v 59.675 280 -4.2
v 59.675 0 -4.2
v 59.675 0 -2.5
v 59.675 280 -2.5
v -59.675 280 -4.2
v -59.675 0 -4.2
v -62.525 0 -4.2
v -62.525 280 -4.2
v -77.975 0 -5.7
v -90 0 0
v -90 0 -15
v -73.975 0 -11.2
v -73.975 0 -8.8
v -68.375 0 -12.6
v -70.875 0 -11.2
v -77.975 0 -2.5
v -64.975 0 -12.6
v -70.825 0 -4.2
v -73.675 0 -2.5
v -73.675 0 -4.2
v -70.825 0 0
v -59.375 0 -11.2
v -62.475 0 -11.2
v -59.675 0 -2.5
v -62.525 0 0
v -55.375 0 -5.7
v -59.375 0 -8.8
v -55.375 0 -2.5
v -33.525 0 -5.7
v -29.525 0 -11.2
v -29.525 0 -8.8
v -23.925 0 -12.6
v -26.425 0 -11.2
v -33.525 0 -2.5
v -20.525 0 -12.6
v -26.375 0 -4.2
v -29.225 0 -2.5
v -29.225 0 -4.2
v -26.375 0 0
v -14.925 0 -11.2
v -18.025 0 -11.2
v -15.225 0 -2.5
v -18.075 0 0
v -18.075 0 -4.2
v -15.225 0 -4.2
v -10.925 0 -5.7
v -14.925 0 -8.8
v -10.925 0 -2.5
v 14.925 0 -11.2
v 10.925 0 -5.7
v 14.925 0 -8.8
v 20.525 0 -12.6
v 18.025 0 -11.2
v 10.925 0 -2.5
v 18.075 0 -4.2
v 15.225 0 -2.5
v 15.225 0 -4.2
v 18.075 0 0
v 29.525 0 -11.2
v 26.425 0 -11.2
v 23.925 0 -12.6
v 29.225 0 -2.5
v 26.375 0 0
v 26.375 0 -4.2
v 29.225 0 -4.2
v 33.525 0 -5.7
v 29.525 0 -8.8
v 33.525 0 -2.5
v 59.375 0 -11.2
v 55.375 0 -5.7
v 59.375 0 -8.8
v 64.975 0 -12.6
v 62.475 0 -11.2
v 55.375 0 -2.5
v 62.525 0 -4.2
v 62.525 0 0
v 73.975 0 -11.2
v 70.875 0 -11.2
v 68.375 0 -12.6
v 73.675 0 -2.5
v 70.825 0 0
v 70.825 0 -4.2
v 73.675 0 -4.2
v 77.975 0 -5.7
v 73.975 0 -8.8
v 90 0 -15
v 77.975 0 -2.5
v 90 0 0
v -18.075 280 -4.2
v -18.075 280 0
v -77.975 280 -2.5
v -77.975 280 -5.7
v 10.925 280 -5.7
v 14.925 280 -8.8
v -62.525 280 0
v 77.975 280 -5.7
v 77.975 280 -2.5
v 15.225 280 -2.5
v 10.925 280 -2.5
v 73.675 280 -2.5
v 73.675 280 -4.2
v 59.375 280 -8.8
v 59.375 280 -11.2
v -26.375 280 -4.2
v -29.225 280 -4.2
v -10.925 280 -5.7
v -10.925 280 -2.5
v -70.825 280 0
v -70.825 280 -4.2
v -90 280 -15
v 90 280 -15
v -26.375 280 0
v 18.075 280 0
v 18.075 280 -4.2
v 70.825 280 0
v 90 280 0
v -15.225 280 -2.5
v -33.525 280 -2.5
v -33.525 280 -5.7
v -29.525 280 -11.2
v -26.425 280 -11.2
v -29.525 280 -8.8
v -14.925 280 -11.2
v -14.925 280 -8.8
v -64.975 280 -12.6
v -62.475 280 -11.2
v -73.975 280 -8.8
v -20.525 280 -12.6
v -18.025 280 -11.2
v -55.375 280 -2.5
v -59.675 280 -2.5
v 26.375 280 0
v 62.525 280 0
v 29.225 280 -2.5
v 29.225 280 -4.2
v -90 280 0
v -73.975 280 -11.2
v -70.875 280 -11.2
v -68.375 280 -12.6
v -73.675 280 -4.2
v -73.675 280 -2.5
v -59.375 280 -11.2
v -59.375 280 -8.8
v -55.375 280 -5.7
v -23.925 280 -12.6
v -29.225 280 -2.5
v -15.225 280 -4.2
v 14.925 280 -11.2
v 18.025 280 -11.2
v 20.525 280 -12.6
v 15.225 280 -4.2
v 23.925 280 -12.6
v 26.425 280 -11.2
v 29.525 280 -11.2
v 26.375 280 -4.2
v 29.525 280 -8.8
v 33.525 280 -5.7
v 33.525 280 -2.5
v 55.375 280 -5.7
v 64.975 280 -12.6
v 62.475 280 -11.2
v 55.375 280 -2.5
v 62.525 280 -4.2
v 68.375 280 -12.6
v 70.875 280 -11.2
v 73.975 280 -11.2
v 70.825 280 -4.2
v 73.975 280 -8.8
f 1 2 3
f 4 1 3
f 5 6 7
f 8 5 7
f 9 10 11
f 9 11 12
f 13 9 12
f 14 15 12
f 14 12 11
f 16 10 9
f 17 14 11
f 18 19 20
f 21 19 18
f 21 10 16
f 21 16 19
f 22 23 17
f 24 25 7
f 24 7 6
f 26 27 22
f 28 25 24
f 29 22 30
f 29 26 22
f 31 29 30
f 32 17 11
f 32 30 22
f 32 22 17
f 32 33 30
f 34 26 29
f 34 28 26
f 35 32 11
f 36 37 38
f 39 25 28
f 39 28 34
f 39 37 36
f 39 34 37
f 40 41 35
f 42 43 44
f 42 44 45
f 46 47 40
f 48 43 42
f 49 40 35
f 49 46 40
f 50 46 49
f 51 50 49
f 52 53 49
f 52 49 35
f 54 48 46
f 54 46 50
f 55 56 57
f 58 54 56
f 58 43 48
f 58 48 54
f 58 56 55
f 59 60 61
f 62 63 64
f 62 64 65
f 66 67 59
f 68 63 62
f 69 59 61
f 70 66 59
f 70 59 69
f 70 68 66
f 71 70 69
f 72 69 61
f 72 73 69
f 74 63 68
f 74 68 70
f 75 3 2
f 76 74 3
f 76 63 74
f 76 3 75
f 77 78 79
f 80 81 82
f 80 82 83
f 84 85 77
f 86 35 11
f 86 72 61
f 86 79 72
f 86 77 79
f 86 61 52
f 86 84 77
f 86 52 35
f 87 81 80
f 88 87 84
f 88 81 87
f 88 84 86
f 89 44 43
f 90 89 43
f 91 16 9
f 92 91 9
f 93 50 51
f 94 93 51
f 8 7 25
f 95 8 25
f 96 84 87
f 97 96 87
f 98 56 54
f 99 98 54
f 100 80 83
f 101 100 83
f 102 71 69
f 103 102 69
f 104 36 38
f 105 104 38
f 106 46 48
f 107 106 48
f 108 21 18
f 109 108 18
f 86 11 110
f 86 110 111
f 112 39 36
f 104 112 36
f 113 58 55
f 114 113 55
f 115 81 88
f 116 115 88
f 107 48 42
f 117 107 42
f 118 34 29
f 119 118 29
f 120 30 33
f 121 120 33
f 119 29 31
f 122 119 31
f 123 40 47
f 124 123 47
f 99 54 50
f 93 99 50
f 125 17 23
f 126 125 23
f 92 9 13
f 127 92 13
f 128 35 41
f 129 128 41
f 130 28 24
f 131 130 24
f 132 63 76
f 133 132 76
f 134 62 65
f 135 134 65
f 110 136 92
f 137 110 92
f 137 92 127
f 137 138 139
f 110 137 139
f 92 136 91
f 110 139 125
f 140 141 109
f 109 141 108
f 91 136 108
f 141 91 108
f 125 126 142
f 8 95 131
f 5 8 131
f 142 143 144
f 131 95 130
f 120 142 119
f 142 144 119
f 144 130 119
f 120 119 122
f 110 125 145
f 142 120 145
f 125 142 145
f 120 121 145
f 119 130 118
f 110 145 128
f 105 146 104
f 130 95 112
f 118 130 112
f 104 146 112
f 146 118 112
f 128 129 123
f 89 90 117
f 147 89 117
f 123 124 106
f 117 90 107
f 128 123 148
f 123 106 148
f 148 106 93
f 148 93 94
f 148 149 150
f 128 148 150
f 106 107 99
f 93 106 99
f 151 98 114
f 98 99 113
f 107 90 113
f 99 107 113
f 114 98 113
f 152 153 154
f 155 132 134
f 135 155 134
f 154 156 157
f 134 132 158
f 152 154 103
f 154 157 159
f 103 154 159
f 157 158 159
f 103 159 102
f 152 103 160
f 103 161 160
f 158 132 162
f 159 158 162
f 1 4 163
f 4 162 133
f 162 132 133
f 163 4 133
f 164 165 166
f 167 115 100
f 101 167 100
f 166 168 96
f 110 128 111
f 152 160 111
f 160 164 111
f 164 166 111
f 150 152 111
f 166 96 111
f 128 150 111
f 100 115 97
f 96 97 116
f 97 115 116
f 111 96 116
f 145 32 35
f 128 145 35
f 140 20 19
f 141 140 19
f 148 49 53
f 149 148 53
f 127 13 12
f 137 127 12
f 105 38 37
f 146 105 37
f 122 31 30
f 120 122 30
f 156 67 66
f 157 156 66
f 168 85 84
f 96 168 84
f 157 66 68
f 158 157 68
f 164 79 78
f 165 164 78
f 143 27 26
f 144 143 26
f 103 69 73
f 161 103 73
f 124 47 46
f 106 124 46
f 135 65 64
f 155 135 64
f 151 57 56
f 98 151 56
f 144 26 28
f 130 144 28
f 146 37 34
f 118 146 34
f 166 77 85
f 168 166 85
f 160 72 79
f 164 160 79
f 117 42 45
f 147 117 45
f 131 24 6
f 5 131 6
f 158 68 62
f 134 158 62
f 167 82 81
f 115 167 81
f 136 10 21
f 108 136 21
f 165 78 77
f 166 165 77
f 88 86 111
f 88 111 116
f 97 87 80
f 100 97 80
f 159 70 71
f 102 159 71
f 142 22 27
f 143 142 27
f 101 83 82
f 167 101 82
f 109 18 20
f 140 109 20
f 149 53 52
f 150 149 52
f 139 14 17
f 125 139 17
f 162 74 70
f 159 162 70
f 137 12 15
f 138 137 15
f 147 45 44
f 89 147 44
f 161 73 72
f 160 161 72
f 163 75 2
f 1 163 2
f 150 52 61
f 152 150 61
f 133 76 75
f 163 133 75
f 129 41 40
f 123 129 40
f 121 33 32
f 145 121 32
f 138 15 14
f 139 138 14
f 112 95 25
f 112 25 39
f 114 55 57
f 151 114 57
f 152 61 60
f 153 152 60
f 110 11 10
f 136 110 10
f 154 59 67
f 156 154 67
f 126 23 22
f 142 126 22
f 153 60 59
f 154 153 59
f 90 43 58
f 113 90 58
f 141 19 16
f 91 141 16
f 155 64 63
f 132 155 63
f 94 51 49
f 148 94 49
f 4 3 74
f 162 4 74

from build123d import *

# Parameters (mm, degrees)
SKETCH001_W         = 180
SKETCH001_H         = 15
PAD_DEPTH           = 280
POCKET_DEPTH        = 280.001
LINEARPATTERN_COUNT = 4
LINEARPATTERN_PITCH = 44.45


with BuildPart() as part:
    # Sketch001 → Pad (new body)
    with BuildSketch(Plane.XZ):
        with Locations((0, -7.5)):
            Rectangle(SKETCH001_W, SKETCH001_H)
    extrude(amount=-PAD_DEPTH)

    # Sketch → Pocket (cut, through all)
    with BuildSketch(Plane.XZ):
        Polygon((-70.825, 0), (-70.825, -4.2), (-73.675, -4.2), (-73.675, -2.5), (-77.975, -2.5), (-77.975, -5.7), (-73.975, -8.8), (-73.975, -11.2), (-70.875, -11.2), (-68.375, -12.6), (-64.975, -12.6), (-62.475, -11.2), (-59.375, -11.2), (-59.375, -8.8), (-55.375, -5.7), (-55.375, -2.5), (-59.675, -2.5), (-59.675, -4.2), (-62.525, -4.2), (-62.525, 0), align=None)
    pocket = extrude(amount=-POCKET_DEPTH, mode=Mode.SUBTRACT)

    # LinearPattern: Pocket ×4
    with Locations(*[(i * LINEARPATTERN_PITCH, 0, 0) for i in range(1, LINEARPATTERN_COUNT)]):
        add(pocket, mode=Mode.SUBTRACT)


solid = part.part
